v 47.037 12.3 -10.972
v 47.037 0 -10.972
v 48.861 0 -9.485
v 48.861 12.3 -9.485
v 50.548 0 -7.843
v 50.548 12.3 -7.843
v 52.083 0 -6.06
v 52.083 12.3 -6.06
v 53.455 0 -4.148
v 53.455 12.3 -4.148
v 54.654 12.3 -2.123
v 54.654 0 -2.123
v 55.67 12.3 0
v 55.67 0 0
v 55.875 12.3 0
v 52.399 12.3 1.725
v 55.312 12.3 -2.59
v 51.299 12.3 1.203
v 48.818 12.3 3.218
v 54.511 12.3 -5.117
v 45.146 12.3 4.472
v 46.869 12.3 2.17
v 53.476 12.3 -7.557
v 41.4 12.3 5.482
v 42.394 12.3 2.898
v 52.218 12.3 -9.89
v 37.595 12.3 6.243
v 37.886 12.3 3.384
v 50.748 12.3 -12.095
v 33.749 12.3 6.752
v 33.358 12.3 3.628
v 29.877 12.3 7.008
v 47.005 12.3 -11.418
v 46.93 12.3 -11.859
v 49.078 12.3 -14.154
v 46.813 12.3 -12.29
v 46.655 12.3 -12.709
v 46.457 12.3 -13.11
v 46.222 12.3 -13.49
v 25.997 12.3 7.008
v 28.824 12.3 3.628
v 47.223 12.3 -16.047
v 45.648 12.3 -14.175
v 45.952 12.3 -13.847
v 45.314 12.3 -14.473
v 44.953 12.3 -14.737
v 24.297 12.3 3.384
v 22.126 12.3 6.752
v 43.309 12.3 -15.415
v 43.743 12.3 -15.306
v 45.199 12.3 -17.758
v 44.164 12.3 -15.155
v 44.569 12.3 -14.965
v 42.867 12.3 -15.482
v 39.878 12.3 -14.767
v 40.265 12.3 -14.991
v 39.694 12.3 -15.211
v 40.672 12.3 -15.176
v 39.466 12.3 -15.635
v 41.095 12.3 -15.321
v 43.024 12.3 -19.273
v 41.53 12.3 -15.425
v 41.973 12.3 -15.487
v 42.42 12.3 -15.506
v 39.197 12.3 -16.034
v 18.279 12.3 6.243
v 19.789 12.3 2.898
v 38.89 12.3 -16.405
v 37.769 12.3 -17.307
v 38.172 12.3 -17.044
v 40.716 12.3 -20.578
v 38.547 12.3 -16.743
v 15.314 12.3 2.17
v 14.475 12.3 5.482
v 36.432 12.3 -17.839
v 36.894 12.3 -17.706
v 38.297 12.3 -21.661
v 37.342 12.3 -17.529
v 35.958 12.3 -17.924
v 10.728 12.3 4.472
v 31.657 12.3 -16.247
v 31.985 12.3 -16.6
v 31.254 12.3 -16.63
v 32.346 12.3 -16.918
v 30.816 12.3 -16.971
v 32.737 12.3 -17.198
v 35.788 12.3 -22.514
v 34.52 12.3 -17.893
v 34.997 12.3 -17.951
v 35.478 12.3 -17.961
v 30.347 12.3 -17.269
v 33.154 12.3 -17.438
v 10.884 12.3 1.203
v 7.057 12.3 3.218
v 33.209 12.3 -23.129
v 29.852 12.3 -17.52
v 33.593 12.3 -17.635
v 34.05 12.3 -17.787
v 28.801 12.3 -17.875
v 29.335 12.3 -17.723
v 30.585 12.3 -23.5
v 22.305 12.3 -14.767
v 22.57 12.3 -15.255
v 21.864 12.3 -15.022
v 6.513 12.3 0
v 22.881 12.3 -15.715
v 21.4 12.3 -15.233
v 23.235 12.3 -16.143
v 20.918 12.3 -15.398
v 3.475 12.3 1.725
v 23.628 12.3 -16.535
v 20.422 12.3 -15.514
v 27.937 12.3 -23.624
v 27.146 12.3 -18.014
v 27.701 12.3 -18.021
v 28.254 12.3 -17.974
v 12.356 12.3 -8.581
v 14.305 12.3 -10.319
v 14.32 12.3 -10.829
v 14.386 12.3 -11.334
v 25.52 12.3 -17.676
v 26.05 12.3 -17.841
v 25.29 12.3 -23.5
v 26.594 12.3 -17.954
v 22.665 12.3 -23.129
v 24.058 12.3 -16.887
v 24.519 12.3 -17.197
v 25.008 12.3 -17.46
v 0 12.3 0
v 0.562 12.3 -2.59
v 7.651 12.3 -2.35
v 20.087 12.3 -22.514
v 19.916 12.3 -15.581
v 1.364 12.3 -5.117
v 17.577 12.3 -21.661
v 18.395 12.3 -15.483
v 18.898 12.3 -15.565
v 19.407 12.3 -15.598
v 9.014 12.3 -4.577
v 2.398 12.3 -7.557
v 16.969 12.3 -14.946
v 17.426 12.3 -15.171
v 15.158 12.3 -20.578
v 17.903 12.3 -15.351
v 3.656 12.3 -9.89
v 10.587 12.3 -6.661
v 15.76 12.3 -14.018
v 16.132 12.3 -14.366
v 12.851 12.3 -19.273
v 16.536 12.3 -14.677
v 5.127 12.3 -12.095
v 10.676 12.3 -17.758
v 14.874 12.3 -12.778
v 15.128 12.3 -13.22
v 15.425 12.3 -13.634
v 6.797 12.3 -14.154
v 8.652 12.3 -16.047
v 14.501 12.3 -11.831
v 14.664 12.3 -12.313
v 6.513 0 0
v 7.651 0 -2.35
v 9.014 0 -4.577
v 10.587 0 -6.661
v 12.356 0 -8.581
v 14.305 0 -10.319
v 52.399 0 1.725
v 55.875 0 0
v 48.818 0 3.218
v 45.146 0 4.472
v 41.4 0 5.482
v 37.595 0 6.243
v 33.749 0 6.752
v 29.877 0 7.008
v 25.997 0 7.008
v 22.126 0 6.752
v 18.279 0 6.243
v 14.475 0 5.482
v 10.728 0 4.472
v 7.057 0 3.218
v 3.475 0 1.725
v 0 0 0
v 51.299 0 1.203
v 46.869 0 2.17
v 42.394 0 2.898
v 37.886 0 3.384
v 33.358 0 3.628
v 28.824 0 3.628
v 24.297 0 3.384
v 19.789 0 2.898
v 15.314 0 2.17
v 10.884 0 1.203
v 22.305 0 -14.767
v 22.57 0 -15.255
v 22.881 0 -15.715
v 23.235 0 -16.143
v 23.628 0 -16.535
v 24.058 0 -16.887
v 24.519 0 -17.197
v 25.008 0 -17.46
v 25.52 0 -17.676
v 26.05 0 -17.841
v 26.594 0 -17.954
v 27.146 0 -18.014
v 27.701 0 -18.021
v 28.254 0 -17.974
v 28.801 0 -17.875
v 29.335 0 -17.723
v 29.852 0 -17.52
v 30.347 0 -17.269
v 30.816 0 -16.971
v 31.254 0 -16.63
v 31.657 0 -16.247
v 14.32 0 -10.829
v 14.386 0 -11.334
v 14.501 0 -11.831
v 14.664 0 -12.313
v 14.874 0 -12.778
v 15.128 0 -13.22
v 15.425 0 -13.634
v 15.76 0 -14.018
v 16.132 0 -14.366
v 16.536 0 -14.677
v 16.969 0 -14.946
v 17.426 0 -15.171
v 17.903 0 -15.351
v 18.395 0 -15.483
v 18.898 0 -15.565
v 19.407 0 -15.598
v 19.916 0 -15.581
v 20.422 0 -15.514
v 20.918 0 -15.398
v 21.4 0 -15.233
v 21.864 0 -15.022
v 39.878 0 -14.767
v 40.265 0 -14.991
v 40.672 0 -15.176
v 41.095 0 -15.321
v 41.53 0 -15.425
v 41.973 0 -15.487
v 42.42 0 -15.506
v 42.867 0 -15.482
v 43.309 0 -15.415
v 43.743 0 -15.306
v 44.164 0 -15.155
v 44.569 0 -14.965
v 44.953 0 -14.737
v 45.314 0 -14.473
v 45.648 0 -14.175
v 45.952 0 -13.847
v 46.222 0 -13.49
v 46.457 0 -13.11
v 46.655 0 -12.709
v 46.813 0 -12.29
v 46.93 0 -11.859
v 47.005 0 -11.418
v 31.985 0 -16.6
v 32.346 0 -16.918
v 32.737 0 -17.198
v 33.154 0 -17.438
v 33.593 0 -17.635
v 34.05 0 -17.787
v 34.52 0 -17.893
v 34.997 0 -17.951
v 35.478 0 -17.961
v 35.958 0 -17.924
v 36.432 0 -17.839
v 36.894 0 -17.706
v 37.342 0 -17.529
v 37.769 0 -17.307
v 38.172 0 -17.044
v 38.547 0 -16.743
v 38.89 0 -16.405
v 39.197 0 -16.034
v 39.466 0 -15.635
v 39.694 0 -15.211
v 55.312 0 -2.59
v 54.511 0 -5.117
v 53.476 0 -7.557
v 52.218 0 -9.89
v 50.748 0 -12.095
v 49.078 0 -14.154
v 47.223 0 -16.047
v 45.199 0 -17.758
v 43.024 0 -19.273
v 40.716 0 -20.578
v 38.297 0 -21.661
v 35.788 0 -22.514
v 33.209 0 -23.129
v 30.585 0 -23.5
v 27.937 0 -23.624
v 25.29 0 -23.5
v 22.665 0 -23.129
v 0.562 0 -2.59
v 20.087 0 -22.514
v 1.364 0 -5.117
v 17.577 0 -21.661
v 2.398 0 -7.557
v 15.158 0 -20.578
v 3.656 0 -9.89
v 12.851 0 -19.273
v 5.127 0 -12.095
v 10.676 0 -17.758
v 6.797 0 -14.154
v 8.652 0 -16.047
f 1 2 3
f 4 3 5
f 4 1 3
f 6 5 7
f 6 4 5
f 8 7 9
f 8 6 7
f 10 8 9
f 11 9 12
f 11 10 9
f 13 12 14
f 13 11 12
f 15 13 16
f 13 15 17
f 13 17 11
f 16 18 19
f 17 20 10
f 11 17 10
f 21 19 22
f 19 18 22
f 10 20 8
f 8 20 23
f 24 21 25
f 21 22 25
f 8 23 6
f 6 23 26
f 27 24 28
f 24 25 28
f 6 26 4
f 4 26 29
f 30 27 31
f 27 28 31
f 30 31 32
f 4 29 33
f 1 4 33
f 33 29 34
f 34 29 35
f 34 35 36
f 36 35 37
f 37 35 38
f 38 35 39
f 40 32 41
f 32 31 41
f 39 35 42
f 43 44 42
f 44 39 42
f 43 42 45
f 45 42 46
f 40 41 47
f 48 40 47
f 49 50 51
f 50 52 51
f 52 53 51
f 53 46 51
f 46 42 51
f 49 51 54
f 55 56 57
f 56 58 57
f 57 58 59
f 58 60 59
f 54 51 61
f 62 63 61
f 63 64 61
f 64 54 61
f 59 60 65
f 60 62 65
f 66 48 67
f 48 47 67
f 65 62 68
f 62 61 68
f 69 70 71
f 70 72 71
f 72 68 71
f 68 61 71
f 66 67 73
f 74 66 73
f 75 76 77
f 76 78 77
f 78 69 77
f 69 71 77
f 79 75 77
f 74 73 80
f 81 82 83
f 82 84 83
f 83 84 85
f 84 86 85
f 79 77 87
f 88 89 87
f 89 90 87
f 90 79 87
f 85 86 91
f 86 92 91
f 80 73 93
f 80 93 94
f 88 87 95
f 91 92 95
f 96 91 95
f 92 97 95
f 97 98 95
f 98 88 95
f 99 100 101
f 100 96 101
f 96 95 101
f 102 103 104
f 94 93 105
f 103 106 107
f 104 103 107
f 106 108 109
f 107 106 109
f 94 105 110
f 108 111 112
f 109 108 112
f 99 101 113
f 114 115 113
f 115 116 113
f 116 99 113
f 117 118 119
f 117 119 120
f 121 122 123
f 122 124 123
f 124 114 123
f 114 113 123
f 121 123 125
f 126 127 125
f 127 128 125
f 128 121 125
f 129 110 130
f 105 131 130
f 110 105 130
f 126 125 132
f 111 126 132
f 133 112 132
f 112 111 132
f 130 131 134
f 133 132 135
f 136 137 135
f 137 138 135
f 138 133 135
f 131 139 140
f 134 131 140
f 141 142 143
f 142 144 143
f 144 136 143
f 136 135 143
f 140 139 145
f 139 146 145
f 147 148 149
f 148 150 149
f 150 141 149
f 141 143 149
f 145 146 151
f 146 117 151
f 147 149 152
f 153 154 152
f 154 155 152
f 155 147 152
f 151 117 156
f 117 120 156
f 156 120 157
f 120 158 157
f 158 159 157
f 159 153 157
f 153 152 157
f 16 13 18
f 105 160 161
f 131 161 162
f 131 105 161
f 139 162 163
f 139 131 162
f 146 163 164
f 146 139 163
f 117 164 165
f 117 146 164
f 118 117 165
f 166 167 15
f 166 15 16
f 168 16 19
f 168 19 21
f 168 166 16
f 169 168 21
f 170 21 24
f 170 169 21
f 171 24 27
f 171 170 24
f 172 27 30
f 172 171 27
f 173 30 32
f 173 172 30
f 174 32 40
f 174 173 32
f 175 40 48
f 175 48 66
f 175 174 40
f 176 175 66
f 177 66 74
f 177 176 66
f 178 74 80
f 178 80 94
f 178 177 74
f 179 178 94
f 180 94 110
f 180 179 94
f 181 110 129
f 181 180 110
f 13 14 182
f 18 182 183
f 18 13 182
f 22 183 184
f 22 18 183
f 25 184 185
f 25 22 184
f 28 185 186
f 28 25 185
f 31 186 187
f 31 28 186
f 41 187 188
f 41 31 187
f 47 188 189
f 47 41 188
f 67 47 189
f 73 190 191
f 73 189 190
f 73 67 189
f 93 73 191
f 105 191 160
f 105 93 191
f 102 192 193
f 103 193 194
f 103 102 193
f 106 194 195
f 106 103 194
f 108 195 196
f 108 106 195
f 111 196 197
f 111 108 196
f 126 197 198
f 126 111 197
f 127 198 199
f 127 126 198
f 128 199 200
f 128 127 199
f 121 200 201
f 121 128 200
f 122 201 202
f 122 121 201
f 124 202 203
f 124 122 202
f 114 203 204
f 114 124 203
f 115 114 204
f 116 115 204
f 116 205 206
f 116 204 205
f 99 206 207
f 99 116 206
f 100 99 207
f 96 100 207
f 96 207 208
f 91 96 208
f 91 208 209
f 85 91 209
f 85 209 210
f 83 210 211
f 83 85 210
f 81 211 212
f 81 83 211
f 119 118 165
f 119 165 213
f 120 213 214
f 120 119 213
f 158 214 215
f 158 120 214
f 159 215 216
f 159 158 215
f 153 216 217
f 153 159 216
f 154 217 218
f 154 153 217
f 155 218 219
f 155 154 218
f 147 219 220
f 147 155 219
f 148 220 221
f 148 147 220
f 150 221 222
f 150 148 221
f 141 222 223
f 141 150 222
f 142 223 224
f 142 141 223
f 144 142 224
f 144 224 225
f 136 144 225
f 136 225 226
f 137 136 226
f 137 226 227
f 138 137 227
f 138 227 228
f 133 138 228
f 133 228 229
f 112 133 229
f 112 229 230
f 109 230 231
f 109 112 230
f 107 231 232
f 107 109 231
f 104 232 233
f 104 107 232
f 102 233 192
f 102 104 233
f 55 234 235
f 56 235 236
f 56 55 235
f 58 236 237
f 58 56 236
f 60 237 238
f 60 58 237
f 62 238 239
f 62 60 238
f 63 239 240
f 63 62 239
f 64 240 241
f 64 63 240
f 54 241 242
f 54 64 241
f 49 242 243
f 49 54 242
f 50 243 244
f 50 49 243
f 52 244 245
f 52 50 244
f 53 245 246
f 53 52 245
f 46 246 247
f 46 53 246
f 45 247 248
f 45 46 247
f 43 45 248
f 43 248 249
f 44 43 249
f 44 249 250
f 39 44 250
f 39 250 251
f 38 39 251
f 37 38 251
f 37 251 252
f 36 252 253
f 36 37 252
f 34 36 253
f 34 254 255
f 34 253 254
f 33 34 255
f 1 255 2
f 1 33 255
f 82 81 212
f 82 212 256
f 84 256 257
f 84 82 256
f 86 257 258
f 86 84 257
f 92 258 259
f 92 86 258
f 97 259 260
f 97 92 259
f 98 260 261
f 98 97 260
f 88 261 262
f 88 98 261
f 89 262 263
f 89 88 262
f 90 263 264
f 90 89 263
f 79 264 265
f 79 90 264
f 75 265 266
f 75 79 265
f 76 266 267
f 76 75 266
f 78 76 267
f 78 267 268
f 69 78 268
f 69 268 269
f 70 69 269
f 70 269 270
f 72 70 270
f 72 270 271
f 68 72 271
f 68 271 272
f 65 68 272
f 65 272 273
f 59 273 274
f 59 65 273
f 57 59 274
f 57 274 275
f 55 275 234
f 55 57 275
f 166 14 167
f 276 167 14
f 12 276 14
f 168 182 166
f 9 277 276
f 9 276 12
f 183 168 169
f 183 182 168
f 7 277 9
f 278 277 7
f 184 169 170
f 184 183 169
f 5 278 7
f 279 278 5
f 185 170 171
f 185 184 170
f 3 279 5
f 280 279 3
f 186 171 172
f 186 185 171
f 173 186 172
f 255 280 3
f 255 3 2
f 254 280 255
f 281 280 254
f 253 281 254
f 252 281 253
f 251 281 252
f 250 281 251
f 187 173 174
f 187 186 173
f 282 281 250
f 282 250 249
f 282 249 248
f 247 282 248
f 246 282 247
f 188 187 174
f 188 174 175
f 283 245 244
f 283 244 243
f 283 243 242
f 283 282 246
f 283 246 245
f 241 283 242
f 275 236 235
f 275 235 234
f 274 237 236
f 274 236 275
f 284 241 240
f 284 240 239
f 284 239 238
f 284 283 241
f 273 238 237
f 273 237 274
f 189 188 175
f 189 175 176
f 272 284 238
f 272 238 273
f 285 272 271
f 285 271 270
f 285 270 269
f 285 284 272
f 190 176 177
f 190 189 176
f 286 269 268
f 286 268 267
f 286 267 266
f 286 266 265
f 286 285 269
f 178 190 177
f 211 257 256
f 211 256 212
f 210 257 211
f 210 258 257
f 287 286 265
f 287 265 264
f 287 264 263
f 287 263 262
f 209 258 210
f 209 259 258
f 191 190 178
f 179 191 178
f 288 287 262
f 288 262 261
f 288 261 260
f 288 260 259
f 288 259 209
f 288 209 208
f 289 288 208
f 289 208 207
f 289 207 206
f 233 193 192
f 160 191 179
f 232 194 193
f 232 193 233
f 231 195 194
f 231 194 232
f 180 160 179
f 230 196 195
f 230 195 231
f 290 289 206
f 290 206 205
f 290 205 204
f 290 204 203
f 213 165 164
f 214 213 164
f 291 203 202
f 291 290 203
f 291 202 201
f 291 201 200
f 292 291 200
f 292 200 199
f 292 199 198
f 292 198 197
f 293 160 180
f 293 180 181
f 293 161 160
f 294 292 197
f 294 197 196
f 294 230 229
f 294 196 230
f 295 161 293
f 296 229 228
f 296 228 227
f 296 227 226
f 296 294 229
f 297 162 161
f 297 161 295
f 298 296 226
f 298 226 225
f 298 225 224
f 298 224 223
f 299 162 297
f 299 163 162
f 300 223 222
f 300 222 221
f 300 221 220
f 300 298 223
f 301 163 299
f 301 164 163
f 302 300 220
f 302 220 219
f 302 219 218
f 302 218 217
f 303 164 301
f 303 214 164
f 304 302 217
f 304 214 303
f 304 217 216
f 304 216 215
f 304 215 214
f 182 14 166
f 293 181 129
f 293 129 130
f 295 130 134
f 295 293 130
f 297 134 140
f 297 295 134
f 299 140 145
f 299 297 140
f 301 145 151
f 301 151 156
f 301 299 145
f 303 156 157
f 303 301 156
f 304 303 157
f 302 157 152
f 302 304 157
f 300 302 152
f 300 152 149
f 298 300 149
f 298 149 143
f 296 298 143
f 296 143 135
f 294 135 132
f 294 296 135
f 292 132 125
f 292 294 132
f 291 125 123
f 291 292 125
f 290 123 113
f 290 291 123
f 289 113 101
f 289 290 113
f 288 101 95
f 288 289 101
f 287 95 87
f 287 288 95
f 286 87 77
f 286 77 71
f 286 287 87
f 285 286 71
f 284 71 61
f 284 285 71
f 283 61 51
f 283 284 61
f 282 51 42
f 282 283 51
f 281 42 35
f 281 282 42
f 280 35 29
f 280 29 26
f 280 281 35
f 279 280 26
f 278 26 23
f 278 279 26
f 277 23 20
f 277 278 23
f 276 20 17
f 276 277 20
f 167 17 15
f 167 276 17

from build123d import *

# Parameters (mm, degrees)
BOSS_EXTRUDE1_DEPTH = 12.3
CUT_EXTRUDE1_DEPTH  = 13.3


with BuildPart() as part:
    # Sketch1 → Boss-Extrude1 (new body)
    with BuildSketch(Plane(origin=(0, 0, 0), x_dir=(1, 0, 0), z_dir=(0, 1, 0))):
        with BuildLine():
            ThreePointArc((0, 0), (27.937327101, 23.623695395), (55.874654202, 0))
            ThreePointArc((55.874654202, 0), (27.937327101, -7.03951799), (0, 0))
        make_face()
    extrude(amount=BOSS_EXTRUDE1_DEPTH)

    # Sketch2 → Cut-Extrude1 (cut, through all)
    with BuildSketch(Plane(origin=(0, 12.3, 0), x_dir=(1, 0, 0), z_dir=(0, 1, 0))):
        with BuildLine():
            ThreePointArc((6.512863529, 0), (9.77491486, 5.638211193), (14.304676712, 10.319200608))
            ThreePointArc((14.304676712, 10.319200608), (16.969047295, 14.945891186), (22.305064172, 14.766837577))
            ThreePointArc((22.305064172, 14.766837577), (26.593603486, 17.95377667), (31.656828978, 16.247348283))
            ThreePointArc((31.656828978, 16.247348283), (36.195985479, 17.887121813), (39.87791775, 14.766837577))
            ThreePointArc((39.87791775, 14.766837577), (44.568649172, 14.965090252), (47.03719079, 10.971524469))
            ThreePointArc((47.03719079, 10.971524469), (52.083128874, 6.059747982), (55.670118393, 0))
            ThreePointArc((55.670118393, 0), (31.091490961, -3.658407288), (6.512863529, 0))
        make_face()
    extrude(amount=-CUT_EXTRUDE1_DEPTH, mode=Mode.SUBTRACT)


solid = part.part
